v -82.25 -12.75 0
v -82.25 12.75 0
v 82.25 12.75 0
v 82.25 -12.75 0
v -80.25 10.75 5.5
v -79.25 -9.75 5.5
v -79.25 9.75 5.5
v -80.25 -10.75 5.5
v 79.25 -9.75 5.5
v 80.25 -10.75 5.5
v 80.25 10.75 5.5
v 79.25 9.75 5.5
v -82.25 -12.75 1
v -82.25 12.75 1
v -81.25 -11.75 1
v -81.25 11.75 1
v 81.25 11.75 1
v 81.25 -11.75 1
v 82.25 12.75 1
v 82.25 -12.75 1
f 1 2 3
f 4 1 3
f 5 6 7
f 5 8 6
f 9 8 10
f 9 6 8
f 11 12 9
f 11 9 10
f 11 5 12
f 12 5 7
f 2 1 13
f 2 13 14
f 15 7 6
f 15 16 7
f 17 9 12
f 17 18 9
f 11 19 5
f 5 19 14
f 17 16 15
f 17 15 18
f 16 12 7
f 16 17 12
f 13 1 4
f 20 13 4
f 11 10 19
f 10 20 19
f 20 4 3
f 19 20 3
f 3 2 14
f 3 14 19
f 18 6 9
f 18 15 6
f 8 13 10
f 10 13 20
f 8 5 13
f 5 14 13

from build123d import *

# Parameters (mm, degrees)
SZKIC1_W                    = 164.5
SZKIC1_H                    = 25.5
DODANIE_WYCI_GNI_CIE1_DEPTH = 1
SZKIC3_W                    = 160.5
SZKIC3_H                    = 21.5
SZKIC2_W                    = 164.5
SZKIC2_H                    = 25.5
SZKIC3_140_W                = 158.5
SZKIC3_140_H                = 19.5
SZKIC2_152_W                = 162.5
SZKIC2_152_H                = 23.5


with BuildPart() as part:
    # Szkic1 → Dodanie-wyciągnięcie1 (new body)
    with BuildSketch(Plane.XY):
        Rectangle(SZKIC1_W, SZKIC1_H)
    extrude(amount=DODANIE_WYCI_GNI_CIE1_DEPTH)

    # Szkic3 → Wyciągnięcie po profilach2 section 0
    with BuildSketch(Plane.XY.offset(5.5)):
        Rectangle(SZKIC3_W, SZKIC3_H)
    # Szkic2 → Wyciągnięcie po profilach2 section 1
    with BuildSketch(Plane.XY.offset(1)):
        Rectangle(SZKIC2_W, SZKIC2_H)
    loft()

    # Szkic3<140> → Wycięcie-wyciągnięcie po profilach1 section 0
    with BuildSketch(Plane.XY.offset(5.5)):
        Rectangle(SZKIC3_140_W, SZKIC3_140_H)
    # Szkic2<152> → Wycięcie-wyciągnięcie po profilach1 section 1
    with BuildSketch(Plane.XY.offset(1)):
        Rectangle(SZKIC2_152_W, SZKIC2_152_H)
    loft(mode=Mode.SUBTRACT)


solid = part.part
